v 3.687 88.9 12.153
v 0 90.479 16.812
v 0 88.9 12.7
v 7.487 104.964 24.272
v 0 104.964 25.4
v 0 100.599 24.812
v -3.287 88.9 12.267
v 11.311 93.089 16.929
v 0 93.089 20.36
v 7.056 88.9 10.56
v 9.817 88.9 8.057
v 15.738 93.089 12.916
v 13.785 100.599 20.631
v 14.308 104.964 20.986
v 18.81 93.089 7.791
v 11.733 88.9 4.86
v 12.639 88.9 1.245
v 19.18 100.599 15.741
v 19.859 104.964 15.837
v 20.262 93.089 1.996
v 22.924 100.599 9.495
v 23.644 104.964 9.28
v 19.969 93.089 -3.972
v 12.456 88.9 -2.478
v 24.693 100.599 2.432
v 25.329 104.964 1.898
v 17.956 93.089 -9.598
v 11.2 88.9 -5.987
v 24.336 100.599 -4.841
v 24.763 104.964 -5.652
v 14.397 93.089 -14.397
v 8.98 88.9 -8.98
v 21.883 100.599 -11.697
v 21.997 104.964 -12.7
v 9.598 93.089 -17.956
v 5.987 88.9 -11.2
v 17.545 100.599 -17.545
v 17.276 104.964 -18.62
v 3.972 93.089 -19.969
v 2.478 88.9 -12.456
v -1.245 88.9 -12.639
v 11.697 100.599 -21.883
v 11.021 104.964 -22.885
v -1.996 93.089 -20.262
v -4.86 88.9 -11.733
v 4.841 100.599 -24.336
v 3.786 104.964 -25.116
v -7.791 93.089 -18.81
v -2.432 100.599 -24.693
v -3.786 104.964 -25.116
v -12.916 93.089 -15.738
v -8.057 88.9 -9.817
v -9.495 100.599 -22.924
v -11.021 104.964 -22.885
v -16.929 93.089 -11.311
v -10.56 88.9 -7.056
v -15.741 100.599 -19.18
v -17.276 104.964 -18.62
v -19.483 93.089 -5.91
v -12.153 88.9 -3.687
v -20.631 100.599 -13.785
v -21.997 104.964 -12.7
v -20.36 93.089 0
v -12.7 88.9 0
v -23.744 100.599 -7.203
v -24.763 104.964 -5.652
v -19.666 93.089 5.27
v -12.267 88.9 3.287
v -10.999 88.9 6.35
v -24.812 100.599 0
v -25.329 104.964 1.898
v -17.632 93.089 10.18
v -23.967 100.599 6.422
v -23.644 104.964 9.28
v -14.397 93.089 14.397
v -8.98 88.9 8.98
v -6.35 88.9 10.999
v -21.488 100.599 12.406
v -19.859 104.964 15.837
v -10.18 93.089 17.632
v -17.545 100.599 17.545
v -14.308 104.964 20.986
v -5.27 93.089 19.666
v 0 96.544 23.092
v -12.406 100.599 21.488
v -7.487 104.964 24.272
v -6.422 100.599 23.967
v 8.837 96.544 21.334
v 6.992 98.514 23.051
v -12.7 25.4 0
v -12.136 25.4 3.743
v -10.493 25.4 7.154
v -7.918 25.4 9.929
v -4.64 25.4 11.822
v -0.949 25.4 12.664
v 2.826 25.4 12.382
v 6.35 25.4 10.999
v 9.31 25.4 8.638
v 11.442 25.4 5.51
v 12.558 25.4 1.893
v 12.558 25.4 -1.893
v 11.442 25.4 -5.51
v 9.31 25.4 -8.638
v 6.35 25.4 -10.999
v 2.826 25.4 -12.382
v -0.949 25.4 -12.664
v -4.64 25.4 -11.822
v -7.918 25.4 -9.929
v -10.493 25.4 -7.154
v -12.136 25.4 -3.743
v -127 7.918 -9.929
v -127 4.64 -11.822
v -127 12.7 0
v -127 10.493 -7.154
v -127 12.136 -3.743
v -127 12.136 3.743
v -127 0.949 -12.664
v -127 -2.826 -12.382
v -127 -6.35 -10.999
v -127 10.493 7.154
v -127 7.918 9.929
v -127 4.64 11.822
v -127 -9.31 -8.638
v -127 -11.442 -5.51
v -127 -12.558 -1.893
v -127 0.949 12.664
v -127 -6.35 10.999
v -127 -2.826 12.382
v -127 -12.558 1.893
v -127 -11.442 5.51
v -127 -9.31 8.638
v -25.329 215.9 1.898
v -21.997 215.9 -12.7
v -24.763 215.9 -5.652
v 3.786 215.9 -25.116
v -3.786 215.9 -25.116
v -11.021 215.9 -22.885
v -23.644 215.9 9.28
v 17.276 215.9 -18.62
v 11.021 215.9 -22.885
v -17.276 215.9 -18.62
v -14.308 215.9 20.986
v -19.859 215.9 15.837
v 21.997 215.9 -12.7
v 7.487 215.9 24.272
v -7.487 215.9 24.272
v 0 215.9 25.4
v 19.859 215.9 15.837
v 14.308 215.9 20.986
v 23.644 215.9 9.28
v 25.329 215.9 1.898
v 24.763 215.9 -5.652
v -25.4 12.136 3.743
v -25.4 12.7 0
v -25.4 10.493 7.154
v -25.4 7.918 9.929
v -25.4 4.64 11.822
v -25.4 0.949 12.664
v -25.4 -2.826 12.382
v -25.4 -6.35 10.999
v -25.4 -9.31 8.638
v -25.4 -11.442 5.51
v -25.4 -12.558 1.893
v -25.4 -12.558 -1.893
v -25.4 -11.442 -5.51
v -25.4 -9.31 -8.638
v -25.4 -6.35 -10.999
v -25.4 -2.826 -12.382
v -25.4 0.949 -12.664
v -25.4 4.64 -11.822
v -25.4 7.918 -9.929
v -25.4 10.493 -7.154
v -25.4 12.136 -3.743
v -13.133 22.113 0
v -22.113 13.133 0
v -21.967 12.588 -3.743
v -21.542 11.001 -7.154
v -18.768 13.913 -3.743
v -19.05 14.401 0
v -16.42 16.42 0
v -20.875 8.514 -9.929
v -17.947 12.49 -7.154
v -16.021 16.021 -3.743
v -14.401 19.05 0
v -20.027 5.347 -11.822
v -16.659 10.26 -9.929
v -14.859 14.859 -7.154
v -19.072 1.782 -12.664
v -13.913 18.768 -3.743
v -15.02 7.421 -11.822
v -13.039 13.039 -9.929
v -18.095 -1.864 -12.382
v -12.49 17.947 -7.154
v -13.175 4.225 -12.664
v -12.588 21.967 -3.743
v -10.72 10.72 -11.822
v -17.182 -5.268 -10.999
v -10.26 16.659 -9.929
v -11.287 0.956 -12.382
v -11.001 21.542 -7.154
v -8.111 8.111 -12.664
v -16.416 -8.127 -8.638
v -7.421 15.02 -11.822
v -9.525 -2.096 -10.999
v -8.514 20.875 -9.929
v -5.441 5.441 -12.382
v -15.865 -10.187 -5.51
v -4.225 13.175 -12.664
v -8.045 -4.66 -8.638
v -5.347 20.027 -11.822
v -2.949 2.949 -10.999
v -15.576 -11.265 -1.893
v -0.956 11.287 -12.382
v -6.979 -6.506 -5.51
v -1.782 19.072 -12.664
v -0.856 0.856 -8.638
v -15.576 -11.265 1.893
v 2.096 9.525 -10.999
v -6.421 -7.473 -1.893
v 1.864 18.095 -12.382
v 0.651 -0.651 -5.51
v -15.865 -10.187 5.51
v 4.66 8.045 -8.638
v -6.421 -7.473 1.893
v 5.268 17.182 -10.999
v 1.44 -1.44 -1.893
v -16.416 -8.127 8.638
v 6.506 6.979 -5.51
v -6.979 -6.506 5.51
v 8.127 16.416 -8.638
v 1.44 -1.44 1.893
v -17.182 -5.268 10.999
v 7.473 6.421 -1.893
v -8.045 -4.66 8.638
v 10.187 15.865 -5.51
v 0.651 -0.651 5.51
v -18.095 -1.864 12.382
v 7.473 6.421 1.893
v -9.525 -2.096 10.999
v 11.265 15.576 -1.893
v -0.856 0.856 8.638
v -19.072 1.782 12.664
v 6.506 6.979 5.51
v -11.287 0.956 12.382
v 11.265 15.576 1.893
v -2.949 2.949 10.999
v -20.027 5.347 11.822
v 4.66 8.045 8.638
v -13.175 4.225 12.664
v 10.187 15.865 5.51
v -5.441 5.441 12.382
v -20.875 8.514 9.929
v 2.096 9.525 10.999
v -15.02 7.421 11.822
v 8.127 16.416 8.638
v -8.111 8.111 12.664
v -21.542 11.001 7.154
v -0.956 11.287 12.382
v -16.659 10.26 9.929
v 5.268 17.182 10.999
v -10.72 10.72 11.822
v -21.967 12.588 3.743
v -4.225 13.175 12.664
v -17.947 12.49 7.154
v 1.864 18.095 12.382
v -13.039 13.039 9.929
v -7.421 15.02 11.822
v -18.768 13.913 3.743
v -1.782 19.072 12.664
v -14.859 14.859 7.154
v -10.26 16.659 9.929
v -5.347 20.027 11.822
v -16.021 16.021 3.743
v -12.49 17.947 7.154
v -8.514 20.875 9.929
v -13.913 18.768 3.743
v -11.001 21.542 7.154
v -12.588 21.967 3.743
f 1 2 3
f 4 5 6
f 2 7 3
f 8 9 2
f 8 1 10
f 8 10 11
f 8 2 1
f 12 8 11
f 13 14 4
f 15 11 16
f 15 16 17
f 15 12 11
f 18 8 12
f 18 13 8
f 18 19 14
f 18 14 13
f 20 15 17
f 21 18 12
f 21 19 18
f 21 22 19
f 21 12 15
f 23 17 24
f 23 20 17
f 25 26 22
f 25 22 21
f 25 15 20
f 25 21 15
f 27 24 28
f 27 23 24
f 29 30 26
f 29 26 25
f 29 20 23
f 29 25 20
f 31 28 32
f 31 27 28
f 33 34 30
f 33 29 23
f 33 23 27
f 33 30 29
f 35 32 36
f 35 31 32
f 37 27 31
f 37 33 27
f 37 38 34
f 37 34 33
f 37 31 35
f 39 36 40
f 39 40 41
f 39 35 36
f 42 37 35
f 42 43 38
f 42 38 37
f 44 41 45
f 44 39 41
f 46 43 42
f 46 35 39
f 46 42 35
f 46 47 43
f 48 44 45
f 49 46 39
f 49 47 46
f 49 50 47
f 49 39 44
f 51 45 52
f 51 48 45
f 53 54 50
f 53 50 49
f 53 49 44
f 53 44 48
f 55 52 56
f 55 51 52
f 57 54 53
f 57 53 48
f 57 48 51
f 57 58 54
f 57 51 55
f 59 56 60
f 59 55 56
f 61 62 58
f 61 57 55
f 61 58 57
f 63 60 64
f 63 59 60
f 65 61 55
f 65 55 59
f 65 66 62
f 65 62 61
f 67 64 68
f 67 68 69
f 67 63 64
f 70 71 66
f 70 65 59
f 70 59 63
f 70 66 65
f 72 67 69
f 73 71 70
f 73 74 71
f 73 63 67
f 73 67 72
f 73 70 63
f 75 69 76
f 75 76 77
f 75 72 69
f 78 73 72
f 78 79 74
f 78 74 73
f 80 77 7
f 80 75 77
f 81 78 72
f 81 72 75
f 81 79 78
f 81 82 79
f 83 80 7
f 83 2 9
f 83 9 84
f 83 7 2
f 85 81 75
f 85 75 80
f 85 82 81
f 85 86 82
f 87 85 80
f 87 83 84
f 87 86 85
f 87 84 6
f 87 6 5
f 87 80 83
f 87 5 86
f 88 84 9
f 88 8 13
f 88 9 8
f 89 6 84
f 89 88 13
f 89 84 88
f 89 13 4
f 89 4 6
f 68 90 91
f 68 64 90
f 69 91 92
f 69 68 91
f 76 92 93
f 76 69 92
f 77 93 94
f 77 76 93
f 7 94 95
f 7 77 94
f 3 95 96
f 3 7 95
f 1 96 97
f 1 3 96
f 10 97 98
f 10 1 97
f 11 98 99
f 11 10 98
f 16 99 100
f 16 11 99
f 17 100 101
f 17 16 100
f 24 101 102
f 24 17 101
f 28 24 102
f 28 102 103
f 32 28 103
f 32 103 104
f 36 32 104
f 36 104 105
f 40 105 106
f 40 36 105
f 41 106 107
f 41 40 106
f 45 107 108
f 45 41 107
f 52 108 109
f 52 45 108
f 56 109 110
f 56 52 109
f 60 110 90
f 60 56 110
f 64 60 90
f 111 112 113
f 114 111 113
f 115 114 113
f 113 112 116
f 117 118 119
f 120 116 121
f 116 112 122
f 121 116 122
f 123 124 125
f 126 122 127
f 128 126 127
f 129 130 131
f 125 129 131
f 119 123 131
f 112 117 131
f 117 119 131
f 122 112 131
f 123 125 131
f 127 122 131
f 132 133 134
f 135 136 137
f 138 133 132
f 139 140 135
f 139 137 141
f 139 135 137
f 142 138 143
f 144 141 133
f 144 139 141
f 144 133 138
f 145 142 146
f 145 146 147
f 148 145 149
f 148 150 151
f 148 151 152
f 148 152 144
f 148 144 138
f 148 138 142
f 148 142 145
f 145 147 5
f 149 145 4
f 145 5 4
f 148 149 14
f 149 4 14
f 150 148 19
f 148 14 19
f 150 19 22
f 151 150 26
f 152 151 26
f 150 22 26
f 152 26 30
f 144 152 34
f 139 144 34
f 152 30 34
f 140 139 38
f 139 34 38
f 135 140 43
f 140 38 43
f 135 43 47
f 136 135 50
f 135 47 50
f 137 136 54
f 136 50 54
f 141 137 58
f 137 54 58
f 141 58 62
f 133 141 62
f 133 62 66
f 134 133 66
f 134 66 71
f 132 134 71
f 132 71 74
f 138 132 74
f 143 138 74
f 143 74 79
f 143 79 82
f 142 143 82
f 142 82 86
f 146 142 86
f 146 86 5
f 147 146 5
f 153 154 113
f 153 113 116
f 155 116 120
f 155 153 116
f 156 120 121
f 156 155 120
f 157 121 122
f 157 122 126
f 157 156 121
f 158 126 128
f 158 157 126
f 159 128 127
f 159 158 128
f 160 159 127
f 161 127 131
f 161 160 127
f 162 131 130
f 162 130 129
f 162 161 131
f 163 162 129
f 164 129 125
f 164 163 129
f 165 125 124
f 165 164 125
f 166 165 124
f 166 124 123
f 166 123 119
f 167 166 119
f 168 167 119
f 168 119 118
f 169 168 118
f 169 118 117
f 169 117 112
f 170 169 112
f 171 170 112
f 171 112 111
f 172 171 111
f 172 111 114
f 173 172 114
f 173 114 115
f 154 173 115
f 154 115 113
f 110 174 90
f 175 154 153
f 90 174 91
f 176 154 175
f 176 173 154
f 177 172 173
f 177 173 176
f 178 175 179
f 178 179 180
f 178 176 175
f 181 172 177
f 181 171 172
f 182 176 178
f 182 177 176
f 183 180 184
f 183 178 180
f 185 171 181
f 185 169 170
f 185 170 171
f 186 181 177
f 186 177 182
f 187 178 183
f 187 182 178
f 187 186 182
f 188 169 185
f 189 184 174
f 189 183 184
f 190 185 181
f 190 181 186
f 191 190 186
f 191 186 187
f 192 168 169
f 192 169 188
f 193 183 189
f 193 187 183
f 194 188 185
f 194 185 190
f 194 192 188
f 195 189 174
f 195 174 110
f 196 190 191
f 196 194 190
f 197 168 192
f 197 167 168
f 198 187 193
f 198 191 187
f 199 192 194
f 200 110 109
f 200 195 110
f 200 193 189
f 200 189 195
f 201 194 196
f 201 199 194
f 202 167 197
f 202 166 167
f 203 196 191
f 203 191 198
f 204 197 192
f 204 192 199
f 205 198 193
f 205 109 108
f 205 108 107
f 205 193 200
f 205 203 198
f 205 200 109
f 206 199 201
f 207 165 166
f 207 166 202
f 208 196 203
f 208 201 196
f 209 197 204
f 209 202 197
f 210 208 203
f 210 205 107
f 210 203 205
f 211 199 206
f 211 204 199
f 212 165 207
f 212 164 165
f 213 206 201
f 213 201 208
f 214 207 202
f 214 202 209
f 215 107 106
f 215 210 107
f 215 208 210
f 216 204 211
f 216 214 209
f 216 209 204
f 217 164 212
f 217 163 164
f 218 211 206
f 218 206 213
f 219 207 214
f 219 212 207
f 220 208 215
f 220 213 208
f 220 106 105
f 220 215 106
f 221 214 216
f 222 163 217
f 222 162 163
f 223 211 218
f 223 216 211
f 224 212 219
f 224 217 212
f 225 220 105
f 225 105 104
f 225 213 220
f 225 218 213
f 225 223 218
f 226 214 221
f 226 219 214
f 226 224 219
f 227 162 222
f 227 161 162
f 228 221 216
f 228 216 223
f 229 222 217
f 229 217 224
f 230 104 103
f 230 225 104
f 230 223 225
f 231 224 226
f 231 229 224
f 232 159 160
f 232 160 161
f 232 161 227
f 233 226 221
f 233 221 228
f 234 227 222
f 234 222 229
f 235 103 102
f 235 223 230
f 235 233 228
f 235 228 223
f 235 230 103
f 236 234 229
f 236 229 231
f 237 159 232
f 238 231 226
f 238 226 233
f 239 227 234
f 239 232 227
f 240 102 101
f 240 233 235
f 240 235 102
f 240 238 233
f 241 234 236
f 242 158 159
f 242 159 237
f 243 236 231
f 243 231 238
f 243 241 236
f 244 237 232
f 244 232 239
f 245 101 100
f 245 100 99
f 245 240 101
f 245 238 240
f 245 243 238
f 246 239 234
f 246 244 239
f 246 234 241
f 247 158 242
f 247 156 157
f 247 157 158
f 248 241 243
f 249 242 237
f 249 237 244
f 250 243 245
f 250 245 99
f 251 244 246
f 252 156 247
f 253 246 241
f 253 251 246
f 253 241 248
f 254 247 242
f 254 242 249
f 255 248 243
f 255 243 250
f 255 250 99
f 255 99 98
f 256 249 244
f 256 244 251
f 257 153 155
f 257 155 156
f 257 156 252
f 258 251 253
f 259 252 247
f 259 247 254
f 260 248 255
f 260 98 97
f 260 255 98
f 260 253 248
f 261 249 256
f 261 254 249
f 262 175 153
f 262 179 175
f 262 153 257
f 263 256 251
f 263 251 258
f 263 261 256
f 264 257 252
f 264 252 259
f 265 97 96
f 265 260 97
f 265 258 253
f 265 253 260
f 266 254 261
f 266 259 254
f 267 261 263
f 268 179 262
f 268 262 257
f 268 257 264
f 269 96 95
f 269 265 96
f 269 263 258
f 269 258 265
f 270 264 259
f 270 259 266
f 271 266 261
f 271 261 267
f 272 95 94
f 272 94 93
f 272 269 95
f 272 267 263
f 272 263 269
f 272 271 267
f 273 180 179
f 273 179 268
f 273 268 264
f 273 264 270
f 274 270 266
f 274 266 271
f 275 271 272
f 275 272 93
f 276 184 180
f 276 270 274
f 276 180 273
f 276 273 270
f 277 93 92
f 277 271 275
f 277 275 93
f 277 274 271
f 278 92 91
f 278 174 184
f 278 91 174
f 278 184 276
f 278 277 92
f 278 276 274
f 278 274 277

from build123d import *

# Parameters (mm, degrees)
SWEEP1_PROFILE_R    = 12.7
SKETCH2_R           = 25.4
BOSS_EXTRUDE1_DEPTH = 127
FILLET1_R           = 16.51


with BuildPart() as part:
    # Sweep1: sweep along a path in Sketch1
    with BuildLine(Plane.XY) as sweep1_path:
        Line((-127, 0), (-25.4, 0))
        ThreePointArc((-25.4, 0), (-7.439487758, 7.439487758), (0, 25.4))
        Line((0, 25.4), (0, 88.9))
    # Sweep1 profile (on start of the path) → Sweep1 (sweep)
    with BuildSketch(Plane.YZ.offset(-127)):
        Circle(SWEEP1_PROFILE_R)
    sweep(path=sweep1_path.line)

    # Sketch2 → Boss-Extrude1 (add)
    with BuildSketch(Plane(origin=(0, 88.9, 0), x_dir=(1, 0, 0), z_dir=(0, 1, 0))):
        with Locations(Location((0, 0, 0), (0, 0, 270))):
            Circle(SKETCH2_R)
    extrude(amount=BOSS_EXTRUDE1_DEPTH)

    # Fillet1
    # the kernel refuses this fillet: 16.51 mm, written as the material it takes off along each edge
    with BuildSketch(Plane(origin=(0, 88.9, 0), x_dir=(0, 0, 1), z_dir=(-1, 0, 0))) as fillet1_piece_1:
        with BuildLine():
            CenterArc((8.89, 16.064370514), FILLET1_R, 283.342363797, 76.657636203)
            Line((12.7, 0), (12.7762, -0.32128741))
            ThreePointArc((12.7762, -0.32128741), (19.05, -0.3302), (25.4, -0.3302))
            Line((25.4, -0.3302), (25.7302, 0))
            Line((25.7302, 0), (25.7302, 16.064370514))
            Line((25.7302, 16.064370514), (25.4, 16.064370514))
        make_face()
    revolve(axis=Axis((0, 88.9, 0), (0, 1, 0)), mode=Mode.SUBTRACT)


solid = part.part
